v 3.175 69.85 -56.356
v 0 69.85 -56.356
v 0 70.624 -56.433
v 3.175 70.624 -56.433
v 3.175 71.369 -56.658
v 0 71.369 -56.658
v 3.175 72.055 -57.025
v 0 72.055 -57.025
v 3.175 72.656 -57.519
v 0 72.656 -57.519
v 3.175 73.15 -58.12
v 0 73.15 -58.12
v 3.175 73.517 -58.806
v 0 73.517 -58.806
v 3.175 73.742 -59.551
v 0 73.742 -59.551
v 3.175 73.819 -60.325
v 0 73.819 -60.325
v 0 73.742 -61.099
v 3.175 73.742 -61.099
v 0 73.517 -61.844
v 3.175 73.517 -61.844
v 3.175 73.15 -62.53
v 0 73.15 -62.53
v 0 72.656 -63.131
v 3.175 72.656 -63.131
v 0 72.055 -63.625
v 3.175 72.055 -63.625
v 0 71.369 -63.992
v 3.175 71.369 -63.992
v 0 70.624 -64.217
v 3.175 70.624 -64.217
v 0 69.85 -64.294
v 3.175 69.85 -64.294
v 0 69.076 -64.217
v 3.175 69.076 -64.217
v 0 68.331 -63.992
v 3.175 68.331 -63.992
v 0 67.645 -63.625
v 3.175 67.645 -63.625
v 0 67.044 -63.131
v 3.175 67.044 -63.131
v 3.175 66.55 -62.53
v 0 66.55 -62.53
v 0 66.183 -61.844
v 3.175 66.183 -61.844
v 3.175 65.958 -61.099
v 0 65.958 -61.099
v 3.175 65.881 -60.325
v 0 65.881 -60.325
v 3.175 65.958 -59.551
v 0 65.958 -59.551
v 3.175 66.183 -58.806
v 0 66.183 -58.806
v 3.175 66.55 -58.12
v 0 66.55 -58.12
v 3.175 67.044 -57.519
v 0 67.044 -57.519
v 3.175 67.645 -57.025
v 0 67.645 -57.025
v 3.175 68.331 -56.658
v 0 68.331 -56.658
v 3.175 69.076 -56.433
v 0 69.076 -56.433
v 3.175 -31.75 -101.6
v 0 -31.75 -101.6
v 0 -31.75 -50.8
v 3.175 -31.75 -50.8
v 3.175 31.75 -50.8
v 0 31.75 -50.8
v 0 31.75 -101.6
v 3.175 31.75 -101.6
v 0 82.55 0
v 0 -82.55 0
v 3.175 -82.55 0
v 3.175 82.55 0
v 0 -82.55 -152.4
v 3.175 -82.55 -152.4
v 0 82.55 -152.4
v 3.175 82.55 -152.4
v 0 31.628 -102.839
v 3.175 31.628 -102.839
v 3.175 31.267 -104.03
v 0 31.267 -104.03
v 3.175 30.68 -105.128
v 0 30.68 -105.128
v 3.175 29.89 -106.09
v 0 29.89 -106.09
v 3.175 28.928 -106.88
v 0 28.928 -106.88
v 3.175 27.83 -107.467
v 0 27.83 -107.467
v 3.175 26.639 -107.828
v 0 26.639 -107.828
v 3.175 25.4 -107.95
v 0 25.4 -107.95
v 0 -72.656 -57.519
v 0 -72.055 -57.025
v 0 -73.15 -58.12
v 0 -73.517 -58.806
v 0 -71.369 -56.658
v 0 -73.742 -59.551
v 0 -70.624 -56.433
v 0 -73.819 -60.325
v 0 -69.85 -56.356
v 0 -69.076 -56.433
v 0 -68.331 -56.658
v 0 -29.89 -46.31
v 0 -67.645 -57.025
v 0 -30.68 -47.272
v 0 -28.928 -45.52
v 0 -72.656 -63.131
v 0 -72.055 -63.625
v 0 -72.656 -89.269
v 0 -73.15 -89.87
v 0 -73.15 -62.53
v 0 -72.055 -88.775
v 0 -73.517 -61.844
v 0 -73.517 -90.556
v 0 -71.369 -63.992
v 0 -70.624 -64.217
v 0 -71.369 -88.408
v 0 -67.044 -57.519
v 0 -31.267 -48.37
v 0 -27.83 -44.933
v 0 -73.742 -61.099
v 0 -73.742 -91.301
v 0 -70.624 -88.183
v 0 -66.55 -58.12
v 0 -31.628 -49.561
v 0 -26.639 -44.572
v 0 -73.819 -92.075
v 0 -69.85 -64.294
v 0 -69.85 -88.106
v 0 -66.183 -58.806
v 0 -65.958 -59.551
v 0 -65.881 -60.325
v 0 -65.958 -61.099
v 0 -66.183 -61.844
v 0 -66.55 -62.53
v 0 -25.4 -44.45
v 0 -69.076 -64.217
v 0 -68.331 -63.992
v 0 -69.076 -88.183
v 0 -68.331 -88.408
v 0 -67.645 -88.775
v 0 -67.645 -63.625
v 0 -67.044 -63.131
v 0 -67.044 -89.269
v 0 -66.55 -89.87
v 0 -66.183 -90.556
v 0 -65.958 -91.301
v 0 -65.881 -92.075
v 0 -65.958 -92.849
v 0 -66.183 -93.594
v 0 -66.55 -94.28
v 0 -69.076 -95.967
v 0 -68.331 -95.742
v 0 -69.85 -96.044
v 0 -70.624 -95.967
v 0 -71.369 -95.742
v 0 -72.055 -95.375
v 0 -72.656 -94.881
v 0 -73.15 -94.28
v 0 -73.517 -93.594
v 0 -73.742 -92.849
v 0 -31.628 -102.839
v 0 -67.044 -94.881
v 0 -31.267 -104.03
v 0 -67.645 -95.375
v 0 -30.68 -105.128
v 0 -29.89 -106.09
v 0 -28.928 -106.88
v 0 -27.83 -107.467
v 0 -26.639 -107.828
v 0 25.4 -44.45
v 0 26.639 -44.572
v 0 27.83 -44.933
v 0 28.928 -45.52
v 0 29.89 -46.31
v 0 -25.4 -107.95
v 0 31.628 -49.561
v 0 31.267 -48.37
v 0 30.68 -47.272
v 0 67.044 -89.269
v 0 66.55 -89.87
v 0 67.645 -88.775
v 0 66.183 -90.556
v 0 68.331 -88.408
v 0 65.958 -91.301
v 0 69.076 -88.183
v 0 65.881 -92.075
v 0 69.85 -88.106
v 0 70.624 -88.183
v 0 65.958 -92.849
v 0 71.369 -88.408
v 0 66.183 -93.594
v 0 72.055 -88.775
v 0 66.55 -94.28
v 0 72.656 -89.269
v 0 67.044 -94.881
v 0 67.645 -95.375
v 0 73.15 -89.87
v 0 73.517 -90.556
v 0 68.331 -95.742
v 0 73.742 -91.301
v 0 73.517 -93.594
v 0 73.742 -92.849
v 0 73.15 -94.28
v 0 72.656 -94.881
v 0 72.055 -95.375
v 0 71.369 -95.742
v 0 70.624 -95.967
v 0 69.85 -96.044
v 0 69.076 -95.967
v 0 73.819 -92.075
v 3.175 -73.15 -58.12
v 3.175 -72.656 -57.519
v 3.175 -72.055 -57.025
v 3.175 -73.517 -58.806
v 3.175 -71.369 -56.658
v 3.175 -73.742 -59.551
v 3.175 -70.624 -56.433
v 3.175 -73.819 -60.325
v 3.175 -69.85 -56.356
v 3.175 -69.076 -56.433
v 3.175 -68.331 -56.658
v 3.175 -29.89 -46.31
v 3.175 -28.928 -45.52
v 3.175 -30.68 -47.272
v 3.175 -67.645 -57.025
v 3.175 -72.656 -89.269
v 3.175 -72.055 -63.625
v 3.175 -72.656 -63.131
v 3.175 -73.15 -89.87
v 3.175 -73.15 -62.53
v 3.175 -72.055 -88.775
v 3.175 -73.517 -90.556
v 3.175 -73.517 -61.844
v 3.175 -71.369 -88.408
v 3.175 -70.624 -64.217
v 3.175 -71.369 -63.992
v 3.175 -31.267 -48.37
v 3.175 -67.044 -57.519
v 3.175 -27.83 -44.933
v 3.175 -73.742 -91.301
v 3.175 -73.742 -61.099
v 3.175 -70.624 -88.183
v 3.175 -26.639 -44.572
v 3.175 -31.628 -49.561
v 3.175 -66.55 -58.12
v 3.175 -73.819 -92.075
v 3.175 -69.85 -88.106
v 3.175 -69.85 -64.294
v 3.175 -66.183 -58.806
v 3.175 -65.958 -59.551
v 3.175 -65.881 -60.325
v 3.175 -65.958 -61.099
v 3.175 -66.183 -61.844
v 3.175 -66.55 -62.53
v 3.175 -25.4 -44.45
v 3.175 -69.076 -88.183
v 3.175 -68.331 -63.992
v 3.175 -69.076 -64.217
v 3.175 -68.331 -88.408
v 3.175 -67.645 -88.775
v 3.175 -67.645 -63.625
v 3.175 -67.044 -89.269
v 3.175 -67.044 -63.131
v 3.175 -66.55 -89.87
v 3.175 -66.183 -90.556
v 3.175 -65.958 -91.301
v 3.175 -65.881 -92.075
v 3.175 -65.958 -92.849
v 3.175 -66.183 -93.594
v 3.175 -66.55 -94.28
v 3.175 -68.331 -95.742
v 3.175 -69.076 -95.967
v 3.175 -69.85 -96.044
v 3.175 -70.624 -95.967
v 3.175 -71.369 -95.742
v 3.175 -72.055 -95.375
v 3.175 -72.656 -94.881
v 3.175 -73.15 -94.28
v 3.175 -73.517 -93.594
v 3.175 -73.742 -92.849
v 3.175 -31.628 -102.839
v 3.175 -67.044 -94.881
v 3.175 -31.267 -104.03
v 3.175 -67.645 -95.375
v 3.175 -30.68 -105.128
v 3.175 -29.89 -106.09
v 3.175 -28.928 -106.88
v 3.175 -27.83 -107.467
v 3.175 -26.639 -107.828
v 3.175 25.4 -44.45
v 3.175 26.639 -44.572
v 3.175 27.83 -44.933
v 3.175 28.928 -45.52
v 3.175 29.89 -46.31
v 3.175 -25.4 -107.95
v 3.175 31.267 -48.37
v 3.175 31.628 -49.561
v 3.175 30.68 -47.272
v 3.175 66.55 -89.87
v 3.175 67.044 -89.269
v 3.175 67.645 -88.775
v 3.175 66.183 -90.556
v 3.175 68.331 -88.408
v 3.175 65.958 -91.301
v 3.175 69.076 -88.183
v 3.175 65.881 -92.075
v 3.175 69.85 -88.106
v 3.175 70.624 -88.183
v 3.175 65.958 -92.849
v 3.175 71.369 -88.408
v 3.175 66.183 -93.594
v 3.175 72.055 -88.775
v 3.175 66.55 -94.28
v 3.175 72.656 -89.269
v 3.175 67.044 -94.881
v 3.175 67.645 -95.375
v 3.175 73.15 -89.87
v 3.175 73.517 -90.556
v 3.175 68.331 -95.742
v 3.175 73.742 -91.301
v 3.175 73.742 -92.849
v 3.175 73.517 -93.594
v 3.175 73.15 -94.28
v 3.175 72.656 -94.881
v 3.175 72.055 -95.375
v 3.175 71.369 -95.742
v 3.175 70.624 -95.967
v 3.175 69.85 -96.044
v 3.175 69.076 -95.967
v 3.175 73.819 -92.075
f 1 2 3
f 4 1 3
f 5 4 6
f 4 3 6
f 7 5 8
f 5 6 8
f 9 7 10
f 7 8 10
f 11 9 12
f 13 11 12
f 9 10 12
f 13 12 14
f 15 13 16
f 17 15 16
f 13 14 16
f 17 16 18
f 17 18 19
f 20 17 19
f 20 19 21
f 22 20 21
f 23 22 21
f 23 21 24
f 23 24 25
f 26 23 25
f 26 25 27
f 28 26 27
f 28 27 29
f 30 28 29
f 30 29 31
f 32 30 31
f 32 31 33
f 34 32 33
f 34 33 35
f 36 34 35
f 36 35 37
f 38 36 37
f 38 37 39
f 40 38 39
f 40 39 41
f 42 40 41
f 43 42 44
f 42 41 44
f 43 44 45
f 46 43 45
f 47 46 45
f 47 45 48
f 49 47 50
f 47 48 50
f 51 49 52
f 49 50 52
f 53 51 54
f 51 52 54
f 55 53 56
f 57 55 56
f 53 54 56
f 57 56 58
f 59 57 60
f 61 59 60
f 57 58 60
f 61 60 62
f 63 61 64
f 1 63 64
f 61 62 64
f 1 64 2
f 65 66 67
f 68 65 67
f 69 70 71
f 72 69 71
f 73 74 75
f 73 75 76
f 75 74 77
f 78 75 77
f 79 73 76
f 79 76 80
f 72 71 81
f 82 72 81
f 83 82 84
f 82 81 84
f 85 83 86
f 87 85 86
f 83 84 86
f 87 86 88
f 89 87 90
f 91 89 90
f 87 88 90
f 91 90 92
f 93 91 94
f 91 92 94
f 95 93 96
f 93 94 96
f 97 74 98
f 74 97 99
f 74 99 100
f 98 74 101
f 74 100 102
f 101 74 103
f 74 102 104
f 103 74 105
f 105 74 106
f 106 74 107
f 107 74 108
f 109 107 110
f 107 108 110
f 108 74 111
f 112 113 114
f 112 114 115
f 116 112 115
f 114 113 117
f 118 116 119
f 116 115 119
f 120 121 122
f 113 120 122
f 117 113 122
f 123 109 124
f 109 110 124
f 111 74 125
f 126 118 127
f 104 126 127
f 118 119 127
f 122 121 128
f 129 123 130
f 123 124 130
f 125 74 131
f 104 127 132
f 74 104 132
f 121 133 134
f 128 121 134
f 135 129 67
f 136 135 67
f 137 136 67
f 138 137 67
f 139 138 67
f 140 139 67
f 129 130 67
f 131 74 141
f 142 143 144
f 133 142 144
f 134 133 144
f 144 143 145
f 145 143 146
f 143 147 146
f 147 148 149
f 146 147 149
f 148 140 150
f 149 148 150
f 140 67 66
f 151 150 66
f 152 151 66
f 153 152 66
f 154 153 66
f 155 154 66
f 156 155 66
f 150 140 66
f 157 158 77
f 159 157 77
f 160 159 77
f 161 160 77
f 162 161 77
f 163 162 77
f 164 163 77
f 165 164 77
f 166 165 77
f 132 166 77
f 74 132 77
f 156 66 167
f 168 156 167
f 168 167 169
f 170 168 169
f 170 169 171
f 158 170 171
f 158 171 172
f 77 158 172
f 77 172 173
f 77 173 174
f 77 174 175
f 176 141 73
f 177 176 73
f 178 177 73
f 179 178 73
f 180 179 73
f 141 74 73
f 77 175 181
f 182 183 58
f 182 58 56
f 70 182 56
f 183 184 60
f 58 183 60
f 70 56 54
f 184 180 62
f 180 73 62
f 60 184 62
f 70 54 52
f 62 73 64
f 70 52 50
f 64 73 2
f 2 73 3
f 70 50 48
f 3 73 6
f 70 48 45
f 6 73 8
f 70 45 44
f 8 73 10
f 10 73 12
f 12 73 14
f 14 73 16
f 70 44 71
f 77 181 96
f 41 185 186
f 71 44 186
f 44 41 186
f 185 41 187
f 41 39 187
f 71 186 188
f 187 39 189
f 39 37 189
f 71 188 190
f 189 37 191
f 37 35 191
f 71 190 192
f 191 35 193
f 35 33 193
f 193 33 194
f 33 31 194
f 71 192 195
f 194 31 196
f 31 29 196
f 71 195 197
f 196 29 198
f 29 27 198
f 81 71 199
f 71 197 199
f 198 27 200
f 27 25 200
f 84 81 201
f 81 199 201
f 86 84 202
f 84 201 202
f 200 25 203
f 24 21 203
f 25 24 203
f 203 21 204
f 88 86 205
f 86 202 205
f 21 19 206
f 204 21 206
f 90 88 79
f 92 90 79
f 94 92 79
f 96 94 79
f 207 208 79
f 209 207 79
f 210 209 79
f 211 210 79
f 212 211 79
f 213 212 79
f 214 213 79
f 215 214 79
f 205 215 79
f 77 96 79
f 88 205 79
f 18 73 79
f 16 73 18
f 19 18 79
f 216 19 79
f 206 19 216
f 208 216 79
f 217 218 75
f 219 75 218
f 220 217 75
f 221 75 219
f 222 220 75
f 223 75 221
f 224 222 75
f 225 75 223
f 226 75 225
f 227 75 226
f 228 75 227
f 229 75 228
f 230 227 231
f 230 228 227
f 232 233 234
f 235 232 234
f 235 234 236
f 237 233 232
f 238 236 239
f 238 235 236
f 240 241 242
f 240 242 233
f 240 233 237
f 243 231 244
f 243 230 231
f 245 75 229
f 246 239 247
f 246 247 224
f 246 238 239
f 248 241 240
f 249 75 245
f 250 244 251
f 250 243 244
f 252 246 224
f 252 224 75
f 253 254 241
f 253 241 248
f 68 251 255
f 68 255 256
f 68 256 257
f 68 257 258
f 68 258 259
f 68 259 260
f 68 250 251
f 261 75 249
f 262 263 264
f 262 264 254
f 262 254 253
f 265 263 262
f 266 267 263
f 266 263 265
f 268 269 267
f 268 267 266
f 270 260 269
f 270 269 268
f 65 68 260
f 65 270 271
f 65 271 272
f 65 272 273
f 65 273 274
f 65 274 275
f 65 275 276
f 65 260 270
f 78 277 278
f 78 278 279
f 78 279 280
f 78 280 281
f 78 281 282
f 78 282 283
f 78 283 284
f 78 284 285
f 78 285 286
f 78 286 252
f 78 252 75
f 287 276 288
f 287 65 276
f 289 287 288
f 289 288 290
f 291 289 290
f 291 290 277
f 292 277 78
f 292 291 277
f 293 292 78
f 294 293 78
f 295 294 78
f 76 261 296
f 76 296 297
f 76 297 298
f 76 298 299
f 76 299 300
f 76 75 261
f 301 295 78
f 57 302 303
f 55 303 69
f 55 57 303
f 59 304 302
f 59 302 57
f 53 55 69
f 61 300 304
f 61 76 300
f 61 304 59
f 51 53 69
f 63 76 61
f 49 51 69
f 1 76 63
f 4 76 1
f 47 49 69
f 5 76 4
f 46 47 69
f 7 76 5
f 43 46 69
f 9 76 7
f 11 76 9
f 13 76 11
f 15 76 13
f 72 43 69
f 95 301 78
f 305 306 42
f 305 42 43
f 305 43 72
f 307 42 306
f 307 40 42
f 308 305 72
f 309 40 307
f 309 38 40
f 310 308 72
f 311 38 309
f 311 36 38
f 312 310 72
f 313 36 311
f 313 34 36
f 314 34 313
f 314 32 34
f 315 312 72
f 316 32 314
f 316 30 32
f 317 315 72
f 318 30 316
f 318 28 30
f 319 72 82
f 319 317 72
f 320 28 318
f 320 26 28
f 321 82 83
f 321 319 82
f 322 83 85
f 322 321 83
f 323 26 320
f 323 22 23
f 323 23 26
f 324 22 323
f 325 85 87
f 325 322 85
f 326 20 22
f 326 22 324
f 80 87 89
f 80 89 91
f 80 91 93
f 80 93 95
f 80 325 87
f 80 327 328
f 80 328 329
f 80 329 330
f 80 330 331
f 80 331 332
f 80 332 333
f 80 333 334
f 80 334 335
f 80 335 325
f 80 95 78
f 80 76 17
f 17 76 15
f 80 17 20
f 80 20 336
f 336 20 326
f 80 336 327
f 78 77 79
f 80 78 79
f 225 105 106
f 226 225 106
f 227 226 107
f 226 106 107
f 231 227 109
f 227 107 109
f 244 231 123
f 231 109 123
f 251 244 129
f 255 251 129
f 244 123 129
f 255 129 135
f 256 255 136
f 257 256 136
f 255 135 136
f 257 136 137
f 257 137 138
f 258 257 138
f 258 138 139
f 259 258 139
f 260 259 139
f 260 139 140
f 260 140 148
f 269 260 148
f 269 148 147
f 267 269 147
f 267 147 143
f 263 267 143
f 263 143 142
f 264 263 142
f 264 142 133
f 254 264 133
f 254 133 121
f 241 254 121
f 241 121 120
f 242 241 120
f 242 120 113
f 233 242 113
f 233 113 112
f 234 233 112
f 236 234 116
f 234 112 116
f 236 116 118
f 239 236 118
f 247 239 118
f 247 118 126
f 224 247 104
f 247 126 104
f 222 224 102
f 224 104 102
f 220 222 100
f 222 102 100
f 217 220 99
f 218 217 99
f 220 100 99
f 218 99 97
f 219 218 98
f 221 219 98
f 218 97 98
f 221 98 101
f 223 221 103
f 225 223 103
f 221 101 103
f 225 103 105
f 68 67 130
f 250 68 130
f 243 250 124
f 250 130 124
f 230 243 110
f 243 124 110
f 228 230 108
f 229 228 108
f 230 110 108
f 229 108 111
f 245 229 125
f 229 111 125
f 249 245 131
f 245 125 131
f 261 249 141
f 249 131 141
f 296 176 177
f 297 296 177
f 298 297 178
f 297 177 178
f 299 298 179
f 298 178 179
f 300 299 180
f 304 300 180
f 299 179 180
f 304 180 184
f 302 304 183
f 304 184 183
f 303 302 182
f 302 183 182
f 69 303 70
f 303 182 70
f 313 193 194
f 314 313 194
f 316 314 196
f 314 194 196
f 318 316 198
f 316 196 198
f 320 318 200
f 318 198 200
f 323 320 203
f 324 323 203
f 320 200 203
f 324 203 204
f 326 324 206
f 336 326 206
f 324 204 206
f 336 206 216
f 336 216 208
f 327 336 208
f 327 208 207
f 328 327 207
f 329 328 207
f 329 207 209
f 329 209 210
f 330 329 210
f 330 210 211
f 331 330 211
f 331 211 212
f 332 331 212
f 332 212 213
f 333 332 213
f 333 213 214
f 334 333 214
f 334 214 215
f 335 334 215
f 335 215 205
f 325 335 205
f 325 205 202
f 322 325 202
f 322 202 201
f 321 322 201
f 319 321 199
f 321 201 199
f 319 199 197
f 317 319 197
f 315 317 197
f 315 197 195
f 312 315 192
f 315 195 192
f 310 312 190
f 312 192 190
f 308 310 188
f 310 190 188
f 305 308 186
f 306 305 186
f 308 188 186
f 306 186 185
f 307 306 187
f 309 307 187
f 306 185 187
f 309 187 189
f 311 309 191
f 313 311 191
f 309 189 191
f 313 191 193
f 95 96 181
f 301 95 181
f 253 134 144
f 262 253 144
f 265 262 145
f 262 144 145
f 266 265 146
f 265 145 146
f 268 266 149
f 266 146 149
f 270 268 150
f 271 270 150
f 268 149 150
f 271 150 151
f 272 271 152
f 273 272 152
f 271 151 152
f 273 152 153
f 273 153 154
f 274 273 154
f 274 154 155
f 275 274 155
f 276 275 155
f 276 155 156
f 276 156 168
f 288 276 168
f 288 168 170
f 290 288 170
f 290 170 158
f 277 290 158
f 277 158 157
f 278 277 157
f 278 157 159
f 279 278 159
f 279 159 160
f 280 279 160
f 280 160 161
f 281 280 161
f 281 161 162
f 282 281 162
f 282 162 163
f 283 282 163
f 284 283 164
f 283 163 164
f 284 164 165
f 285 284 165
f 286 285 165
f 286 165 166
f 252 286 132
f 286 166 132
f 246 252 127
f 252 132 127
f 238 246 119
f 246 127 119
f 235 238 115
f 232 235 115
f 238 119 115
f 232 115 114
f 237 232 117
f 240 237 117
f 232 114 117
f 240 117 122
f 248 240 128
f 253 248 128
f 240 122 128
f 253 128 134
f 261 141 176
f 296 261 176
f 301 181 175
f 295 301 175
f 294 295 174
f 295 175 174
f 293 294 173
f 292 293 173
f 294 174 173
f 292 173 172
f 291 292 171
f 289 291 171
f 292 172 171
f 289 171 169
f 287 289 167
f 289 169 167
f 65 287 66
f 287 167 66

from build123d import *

# Parameters (mm, degrees)
SKETCH1_W           = 152.4
SKETCH1_H           = 165.1
BOSS_EXTRUDE1_DEPTH = 3.175
CUT_EXTRUDE1_DEPTH  = 4.175
SKETCH3_R           = 3.96875
CUT_EXTRUDE2_DEPTH  = 4.175


with BuildPart() as part:
    # Sketch1 → Boss-Extrude1 (new body)
    with BuildSketch(Plane(origin=(0, 0, 0), x_dir=(0, 0, -1), z_dir=(1, 0, 0))):
        with Locations((76.2, 0)):
            Rectangle(SKETCH1_W, SKETCH1_H)
    extrude(amount=BOSS_EXTRUDE1_DEPTH)

    # Sketch2 → Cut-Extrude1 (cut, through all)
    with BuildSketch(Plane.ZY):
        with BuildLine():
            Line((-107.95, 25.4), (-107.95, -25.4))
            ThreePointArc((-107.95, -25.4), (-106.090128061, -29.890128061), (-101.6, -31.75))
            Line((-101.6, -31.75), (-50.8, -31.75))
            ThreePointArc((-50.8, -31.75), (-46.309871939, -29.890128061), (-44.45, -25.4))
            Line((-44.45, -25.4), (-44.45, 25.4))
            ThreePointArc((-44.45, 25.4), (-46.309871939, 29.890128061), (-50.8, 31.75))
            Line((-50.8, 31.75), (-101.6, 31.75))
            ThreePointArc((-101.6, 31.75), (-106.090128061, 29.890128061), (-107.95, 25.4))
        make_face()
    extrude(amount=-CUT_EXTRUDE1_DEPTH, mode=Mode.SUBTRACT)

    # Sketch3 → Cut-Extrude2 (cut, through all)
    with BuildSketch(Plane.ZY):
        with Locations((-60.325, 69.85)):
            Circle(SKETCH3_R)
        with Locations((-92.075, 69.85)):
            Circle(SKETCH3_R)
        with Locations((-92.075, -69.85)):
            Circle(SKETCH3_R)
        with Locations((-60.325, -69.85)):
            Circle(SKETCH3_R)
    extrude(amount=-CUT_EXTRUDE2_DEPTH, mode=Mode.SUBTRACT)


solid = part.part
